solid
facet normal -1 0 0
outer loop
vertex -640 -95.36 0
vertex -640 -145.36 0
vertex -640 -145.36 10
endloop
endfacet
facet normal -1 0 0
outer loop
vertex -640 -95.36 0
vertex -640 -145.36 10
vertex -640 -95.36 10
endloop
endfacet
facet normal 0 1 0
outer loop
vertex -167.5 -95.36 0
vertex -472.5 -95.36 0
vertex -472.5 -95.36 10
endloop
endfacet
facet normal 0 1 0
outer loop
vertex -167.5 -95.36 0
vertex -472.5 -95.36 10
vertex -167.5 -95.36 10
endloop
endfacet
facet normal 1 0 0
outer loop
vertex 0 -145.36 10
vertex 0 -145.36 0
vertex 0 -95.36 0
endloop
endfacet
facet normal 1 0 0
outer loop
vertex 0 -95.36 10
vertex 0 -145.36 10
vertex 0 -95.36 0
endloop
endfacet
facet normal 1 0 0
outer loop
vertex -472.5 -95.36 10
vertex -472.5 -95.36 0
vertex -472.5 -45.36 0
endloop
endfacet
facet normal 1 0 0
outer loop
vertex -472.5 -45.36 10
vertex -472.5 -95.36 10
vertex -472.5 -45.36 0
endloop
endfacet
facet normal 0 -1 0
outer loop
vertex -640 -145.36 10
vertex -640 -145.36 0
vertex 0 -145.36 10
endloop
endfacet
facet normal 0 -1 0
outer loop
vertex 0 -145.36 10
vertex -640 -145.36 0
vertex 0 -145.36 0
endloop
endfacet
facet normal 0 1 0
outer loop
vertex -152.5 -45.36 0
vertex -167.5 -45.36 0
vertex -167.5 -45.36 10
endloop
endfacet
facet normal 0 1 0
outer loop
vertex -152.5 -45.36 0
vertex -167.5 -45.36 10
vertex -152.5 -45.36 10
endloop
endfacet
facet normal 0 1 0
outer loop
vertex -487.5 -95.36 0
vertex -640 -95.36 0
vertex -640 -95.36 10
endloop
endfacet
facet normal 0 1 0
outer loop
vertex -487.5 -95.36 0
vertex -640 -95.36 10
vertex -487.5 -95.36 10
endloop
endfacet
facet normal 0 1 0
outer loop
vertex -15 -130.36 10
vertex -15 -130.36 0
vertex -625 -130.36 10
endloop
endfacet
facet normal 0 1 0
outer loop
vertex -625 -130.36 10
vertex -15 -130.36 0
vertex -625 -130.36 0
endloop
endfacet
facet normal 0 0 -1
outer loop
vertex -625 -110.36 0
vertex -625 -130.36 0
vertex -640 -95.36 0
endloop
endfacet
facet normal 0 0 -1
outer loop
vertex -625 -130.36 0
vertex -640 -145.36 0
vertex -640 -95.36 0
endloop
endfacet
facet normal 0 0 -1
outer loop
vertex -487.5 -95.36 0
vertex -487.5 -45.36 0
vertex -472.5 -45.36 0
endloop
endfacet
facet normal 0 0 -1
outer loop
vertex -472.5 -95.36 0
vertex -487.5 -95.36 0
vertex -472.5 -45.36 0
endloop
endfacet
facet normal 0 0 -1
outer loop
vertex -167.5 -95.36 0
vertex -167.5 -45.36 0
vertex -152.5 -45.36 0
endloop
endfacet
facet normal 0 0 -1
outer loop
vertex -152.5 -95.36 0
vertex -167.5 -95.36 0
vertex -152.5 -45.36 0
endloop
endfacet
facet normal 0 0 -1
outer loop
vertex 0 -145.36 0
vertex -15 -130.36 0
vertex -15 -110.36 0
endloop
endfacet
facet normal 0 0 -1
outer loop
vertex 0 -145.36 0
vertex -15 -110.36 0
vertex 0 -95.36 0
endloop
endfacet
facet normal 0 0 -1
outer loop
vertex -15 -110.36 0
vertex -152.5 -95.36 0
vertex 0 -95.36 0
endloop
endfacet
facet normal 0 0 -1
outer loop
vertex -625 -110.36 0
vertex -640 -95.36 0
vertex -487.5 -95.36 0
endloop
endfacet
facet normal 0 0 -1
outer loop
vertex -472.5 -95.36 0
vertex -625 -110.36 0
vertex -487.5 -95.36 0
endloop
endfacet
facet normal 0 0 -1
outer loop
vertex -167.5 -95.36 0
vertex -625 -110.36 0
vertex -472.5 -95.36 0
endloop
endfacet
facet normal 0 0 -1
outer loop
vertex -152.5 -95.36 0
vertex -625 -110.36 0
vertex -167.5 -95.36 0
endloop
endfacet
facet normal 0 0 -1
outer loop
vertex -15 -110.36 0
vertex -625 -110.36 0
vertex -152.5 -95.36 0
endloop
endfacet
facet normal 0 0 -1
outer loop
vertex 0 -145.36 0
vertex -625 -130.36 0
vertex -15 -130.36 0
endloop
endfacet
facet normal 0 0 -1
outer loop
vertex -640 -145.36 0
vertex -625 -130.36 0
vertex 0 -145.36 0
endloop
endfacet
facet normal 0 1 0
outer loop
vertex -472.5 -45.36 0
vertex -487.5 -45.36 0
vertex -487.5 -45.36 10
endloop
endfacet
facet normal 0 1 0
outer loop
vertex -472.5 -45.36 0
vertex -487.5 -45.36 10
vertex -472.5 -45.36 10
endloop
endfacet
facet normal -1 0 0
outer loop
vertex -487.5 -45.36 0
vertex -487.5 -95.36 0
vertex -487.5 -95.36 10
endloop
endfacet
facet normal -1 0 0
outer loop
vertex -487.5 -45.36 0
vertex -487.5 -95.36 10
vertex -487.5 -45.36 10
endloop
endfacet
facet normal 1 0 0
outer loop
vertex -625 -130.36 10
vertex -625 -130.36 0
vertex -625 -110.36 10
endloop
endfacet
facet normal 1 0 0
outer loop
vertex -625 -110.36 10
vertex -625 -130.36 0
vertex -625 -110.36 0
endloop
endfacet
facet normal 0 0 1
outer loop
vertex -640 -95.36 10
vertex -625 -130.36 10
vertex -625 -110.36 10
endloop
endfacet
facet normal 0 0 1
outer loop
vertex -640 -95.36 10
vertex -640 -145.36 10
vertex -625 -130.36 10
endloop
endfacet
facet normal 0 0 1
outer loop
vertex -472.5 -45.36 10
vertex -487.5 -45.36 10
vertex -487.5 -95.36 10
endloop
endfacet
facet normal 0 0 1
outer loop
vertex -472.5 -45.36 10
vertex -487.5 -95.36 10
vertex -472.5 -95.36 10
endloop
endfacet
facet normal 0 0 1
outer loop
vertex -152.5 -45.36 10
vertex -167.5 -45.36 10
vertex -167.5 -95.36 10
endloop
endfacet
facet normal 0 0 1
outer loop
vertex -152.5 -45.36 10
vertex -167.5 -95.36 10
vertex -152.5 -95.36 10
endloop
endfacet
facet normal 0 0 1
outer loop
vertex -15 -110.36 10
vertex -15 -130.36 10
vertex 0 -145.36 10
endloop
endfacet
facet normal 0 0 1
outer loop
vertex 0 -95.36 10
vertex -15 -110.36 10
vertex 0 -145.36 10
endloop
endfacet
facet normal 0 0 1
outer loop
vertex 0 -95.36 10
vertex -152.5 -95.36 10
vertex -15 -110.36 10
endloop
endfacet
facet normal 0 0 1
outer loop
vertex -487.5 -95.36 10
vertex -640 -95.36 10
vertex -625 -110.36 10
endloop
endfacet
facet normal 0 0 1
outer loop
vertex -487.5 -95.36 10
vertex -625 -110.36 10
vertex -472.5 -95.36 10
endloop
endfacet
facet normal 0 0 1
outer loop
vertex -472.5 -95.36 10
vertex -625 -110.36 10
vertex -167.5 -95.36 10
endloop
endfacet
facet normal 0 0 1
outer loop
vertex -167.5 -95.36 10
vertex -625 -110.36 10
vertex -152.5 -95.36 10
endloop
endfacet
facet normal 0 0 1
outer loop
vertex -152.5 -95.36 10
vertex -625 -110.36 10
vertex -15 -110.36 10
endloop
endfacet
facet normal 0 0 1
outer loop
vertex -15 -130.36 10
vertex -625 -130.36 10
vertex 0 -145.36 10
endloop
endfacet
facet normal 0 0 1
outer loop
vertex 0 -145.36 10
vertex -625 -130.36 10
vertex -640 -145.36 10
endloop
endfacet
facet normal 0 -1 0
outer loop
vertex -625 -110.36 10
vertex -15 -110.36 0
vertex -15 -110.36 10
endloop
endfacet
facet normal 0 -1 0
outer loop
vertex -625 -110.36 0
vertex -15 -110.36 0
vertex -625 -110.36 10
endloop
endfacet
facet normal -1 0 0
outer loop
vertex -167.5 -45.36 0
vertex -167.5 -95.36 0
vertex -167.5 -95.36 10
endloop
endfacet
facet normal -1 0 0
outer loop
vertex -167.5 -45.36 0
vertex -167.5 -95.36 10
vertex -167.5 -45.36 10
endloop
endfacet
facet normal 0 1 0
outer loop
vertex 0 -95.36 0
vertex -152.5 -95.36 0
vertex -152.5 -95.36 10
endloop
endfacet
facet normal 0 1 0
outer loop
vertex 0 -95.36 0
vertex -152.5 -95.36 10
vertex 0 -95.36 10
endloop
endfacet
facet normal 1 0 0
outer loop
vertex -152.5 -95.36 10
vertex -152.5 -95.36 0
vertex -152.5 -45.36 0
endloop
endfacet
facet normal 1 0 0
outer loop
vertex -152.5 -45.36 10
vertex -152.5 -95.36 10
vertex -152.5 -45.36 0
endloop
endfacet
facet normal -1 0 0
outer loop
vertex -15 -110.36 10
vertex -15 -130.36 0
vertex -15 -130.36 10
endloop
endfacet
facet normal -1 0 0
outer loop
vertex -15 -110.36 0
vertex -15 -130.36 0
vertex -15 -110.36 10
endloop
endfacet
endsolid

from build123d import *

# Parameters (mm, degrees)
SKETCH1_W           = 640
SKETCH1_H           = 50
BOSS_EXTRUDE1_DEPTH = 10
SKETCH2_W           = 15
SKETCH2_H           = 50
BOSS_EXTRUDE2_DEPTH = 10
SKETCH3_W           = 610
SKETCH3_H           = 20
CUT_EXTRUDE1_DEPTH  = 10


with BuildPart() as part:
    # Sketch1 → Boss-Extrude1 (new body)
    with BuildSketch(Plane.XY):
        with Locations((-320, -120.36)):
            Rectangle(SKETCH1_W, SKETCH1_H)
    extrude(amount=BOSS_EXTRUDE1_DEPTH)

    # Sketch2 → Boss-Extrude2 (add)
    with BuildSketch(Plane.XY):
        with Locations((-160, -70.36)):
            Rectangle(SKETCH2_W, SKETCH2_H)
        with Locations((-480, -70.36)):
            Rectangle(SKETCH2_W, SKETCH2_H)
    extrude(amount=BOSS_EXTRUDE2_DEPTH)

    # Sketch3 → Cut-Extrude1 (cut)
    with BuildSketch(Plane(origin=(0, 0, 0), x_dir=(-1, 0, 0), z_dir=(0, 0, -1))):
        with Locations((320, -120.36)):
            Rectangle(SKETCH3_W, SKETCH3_H)
    extrude(amount=-CUT_EXTRUDE1_DEPTH, mode=Mode.SUBTRACT)


solid = part.part
